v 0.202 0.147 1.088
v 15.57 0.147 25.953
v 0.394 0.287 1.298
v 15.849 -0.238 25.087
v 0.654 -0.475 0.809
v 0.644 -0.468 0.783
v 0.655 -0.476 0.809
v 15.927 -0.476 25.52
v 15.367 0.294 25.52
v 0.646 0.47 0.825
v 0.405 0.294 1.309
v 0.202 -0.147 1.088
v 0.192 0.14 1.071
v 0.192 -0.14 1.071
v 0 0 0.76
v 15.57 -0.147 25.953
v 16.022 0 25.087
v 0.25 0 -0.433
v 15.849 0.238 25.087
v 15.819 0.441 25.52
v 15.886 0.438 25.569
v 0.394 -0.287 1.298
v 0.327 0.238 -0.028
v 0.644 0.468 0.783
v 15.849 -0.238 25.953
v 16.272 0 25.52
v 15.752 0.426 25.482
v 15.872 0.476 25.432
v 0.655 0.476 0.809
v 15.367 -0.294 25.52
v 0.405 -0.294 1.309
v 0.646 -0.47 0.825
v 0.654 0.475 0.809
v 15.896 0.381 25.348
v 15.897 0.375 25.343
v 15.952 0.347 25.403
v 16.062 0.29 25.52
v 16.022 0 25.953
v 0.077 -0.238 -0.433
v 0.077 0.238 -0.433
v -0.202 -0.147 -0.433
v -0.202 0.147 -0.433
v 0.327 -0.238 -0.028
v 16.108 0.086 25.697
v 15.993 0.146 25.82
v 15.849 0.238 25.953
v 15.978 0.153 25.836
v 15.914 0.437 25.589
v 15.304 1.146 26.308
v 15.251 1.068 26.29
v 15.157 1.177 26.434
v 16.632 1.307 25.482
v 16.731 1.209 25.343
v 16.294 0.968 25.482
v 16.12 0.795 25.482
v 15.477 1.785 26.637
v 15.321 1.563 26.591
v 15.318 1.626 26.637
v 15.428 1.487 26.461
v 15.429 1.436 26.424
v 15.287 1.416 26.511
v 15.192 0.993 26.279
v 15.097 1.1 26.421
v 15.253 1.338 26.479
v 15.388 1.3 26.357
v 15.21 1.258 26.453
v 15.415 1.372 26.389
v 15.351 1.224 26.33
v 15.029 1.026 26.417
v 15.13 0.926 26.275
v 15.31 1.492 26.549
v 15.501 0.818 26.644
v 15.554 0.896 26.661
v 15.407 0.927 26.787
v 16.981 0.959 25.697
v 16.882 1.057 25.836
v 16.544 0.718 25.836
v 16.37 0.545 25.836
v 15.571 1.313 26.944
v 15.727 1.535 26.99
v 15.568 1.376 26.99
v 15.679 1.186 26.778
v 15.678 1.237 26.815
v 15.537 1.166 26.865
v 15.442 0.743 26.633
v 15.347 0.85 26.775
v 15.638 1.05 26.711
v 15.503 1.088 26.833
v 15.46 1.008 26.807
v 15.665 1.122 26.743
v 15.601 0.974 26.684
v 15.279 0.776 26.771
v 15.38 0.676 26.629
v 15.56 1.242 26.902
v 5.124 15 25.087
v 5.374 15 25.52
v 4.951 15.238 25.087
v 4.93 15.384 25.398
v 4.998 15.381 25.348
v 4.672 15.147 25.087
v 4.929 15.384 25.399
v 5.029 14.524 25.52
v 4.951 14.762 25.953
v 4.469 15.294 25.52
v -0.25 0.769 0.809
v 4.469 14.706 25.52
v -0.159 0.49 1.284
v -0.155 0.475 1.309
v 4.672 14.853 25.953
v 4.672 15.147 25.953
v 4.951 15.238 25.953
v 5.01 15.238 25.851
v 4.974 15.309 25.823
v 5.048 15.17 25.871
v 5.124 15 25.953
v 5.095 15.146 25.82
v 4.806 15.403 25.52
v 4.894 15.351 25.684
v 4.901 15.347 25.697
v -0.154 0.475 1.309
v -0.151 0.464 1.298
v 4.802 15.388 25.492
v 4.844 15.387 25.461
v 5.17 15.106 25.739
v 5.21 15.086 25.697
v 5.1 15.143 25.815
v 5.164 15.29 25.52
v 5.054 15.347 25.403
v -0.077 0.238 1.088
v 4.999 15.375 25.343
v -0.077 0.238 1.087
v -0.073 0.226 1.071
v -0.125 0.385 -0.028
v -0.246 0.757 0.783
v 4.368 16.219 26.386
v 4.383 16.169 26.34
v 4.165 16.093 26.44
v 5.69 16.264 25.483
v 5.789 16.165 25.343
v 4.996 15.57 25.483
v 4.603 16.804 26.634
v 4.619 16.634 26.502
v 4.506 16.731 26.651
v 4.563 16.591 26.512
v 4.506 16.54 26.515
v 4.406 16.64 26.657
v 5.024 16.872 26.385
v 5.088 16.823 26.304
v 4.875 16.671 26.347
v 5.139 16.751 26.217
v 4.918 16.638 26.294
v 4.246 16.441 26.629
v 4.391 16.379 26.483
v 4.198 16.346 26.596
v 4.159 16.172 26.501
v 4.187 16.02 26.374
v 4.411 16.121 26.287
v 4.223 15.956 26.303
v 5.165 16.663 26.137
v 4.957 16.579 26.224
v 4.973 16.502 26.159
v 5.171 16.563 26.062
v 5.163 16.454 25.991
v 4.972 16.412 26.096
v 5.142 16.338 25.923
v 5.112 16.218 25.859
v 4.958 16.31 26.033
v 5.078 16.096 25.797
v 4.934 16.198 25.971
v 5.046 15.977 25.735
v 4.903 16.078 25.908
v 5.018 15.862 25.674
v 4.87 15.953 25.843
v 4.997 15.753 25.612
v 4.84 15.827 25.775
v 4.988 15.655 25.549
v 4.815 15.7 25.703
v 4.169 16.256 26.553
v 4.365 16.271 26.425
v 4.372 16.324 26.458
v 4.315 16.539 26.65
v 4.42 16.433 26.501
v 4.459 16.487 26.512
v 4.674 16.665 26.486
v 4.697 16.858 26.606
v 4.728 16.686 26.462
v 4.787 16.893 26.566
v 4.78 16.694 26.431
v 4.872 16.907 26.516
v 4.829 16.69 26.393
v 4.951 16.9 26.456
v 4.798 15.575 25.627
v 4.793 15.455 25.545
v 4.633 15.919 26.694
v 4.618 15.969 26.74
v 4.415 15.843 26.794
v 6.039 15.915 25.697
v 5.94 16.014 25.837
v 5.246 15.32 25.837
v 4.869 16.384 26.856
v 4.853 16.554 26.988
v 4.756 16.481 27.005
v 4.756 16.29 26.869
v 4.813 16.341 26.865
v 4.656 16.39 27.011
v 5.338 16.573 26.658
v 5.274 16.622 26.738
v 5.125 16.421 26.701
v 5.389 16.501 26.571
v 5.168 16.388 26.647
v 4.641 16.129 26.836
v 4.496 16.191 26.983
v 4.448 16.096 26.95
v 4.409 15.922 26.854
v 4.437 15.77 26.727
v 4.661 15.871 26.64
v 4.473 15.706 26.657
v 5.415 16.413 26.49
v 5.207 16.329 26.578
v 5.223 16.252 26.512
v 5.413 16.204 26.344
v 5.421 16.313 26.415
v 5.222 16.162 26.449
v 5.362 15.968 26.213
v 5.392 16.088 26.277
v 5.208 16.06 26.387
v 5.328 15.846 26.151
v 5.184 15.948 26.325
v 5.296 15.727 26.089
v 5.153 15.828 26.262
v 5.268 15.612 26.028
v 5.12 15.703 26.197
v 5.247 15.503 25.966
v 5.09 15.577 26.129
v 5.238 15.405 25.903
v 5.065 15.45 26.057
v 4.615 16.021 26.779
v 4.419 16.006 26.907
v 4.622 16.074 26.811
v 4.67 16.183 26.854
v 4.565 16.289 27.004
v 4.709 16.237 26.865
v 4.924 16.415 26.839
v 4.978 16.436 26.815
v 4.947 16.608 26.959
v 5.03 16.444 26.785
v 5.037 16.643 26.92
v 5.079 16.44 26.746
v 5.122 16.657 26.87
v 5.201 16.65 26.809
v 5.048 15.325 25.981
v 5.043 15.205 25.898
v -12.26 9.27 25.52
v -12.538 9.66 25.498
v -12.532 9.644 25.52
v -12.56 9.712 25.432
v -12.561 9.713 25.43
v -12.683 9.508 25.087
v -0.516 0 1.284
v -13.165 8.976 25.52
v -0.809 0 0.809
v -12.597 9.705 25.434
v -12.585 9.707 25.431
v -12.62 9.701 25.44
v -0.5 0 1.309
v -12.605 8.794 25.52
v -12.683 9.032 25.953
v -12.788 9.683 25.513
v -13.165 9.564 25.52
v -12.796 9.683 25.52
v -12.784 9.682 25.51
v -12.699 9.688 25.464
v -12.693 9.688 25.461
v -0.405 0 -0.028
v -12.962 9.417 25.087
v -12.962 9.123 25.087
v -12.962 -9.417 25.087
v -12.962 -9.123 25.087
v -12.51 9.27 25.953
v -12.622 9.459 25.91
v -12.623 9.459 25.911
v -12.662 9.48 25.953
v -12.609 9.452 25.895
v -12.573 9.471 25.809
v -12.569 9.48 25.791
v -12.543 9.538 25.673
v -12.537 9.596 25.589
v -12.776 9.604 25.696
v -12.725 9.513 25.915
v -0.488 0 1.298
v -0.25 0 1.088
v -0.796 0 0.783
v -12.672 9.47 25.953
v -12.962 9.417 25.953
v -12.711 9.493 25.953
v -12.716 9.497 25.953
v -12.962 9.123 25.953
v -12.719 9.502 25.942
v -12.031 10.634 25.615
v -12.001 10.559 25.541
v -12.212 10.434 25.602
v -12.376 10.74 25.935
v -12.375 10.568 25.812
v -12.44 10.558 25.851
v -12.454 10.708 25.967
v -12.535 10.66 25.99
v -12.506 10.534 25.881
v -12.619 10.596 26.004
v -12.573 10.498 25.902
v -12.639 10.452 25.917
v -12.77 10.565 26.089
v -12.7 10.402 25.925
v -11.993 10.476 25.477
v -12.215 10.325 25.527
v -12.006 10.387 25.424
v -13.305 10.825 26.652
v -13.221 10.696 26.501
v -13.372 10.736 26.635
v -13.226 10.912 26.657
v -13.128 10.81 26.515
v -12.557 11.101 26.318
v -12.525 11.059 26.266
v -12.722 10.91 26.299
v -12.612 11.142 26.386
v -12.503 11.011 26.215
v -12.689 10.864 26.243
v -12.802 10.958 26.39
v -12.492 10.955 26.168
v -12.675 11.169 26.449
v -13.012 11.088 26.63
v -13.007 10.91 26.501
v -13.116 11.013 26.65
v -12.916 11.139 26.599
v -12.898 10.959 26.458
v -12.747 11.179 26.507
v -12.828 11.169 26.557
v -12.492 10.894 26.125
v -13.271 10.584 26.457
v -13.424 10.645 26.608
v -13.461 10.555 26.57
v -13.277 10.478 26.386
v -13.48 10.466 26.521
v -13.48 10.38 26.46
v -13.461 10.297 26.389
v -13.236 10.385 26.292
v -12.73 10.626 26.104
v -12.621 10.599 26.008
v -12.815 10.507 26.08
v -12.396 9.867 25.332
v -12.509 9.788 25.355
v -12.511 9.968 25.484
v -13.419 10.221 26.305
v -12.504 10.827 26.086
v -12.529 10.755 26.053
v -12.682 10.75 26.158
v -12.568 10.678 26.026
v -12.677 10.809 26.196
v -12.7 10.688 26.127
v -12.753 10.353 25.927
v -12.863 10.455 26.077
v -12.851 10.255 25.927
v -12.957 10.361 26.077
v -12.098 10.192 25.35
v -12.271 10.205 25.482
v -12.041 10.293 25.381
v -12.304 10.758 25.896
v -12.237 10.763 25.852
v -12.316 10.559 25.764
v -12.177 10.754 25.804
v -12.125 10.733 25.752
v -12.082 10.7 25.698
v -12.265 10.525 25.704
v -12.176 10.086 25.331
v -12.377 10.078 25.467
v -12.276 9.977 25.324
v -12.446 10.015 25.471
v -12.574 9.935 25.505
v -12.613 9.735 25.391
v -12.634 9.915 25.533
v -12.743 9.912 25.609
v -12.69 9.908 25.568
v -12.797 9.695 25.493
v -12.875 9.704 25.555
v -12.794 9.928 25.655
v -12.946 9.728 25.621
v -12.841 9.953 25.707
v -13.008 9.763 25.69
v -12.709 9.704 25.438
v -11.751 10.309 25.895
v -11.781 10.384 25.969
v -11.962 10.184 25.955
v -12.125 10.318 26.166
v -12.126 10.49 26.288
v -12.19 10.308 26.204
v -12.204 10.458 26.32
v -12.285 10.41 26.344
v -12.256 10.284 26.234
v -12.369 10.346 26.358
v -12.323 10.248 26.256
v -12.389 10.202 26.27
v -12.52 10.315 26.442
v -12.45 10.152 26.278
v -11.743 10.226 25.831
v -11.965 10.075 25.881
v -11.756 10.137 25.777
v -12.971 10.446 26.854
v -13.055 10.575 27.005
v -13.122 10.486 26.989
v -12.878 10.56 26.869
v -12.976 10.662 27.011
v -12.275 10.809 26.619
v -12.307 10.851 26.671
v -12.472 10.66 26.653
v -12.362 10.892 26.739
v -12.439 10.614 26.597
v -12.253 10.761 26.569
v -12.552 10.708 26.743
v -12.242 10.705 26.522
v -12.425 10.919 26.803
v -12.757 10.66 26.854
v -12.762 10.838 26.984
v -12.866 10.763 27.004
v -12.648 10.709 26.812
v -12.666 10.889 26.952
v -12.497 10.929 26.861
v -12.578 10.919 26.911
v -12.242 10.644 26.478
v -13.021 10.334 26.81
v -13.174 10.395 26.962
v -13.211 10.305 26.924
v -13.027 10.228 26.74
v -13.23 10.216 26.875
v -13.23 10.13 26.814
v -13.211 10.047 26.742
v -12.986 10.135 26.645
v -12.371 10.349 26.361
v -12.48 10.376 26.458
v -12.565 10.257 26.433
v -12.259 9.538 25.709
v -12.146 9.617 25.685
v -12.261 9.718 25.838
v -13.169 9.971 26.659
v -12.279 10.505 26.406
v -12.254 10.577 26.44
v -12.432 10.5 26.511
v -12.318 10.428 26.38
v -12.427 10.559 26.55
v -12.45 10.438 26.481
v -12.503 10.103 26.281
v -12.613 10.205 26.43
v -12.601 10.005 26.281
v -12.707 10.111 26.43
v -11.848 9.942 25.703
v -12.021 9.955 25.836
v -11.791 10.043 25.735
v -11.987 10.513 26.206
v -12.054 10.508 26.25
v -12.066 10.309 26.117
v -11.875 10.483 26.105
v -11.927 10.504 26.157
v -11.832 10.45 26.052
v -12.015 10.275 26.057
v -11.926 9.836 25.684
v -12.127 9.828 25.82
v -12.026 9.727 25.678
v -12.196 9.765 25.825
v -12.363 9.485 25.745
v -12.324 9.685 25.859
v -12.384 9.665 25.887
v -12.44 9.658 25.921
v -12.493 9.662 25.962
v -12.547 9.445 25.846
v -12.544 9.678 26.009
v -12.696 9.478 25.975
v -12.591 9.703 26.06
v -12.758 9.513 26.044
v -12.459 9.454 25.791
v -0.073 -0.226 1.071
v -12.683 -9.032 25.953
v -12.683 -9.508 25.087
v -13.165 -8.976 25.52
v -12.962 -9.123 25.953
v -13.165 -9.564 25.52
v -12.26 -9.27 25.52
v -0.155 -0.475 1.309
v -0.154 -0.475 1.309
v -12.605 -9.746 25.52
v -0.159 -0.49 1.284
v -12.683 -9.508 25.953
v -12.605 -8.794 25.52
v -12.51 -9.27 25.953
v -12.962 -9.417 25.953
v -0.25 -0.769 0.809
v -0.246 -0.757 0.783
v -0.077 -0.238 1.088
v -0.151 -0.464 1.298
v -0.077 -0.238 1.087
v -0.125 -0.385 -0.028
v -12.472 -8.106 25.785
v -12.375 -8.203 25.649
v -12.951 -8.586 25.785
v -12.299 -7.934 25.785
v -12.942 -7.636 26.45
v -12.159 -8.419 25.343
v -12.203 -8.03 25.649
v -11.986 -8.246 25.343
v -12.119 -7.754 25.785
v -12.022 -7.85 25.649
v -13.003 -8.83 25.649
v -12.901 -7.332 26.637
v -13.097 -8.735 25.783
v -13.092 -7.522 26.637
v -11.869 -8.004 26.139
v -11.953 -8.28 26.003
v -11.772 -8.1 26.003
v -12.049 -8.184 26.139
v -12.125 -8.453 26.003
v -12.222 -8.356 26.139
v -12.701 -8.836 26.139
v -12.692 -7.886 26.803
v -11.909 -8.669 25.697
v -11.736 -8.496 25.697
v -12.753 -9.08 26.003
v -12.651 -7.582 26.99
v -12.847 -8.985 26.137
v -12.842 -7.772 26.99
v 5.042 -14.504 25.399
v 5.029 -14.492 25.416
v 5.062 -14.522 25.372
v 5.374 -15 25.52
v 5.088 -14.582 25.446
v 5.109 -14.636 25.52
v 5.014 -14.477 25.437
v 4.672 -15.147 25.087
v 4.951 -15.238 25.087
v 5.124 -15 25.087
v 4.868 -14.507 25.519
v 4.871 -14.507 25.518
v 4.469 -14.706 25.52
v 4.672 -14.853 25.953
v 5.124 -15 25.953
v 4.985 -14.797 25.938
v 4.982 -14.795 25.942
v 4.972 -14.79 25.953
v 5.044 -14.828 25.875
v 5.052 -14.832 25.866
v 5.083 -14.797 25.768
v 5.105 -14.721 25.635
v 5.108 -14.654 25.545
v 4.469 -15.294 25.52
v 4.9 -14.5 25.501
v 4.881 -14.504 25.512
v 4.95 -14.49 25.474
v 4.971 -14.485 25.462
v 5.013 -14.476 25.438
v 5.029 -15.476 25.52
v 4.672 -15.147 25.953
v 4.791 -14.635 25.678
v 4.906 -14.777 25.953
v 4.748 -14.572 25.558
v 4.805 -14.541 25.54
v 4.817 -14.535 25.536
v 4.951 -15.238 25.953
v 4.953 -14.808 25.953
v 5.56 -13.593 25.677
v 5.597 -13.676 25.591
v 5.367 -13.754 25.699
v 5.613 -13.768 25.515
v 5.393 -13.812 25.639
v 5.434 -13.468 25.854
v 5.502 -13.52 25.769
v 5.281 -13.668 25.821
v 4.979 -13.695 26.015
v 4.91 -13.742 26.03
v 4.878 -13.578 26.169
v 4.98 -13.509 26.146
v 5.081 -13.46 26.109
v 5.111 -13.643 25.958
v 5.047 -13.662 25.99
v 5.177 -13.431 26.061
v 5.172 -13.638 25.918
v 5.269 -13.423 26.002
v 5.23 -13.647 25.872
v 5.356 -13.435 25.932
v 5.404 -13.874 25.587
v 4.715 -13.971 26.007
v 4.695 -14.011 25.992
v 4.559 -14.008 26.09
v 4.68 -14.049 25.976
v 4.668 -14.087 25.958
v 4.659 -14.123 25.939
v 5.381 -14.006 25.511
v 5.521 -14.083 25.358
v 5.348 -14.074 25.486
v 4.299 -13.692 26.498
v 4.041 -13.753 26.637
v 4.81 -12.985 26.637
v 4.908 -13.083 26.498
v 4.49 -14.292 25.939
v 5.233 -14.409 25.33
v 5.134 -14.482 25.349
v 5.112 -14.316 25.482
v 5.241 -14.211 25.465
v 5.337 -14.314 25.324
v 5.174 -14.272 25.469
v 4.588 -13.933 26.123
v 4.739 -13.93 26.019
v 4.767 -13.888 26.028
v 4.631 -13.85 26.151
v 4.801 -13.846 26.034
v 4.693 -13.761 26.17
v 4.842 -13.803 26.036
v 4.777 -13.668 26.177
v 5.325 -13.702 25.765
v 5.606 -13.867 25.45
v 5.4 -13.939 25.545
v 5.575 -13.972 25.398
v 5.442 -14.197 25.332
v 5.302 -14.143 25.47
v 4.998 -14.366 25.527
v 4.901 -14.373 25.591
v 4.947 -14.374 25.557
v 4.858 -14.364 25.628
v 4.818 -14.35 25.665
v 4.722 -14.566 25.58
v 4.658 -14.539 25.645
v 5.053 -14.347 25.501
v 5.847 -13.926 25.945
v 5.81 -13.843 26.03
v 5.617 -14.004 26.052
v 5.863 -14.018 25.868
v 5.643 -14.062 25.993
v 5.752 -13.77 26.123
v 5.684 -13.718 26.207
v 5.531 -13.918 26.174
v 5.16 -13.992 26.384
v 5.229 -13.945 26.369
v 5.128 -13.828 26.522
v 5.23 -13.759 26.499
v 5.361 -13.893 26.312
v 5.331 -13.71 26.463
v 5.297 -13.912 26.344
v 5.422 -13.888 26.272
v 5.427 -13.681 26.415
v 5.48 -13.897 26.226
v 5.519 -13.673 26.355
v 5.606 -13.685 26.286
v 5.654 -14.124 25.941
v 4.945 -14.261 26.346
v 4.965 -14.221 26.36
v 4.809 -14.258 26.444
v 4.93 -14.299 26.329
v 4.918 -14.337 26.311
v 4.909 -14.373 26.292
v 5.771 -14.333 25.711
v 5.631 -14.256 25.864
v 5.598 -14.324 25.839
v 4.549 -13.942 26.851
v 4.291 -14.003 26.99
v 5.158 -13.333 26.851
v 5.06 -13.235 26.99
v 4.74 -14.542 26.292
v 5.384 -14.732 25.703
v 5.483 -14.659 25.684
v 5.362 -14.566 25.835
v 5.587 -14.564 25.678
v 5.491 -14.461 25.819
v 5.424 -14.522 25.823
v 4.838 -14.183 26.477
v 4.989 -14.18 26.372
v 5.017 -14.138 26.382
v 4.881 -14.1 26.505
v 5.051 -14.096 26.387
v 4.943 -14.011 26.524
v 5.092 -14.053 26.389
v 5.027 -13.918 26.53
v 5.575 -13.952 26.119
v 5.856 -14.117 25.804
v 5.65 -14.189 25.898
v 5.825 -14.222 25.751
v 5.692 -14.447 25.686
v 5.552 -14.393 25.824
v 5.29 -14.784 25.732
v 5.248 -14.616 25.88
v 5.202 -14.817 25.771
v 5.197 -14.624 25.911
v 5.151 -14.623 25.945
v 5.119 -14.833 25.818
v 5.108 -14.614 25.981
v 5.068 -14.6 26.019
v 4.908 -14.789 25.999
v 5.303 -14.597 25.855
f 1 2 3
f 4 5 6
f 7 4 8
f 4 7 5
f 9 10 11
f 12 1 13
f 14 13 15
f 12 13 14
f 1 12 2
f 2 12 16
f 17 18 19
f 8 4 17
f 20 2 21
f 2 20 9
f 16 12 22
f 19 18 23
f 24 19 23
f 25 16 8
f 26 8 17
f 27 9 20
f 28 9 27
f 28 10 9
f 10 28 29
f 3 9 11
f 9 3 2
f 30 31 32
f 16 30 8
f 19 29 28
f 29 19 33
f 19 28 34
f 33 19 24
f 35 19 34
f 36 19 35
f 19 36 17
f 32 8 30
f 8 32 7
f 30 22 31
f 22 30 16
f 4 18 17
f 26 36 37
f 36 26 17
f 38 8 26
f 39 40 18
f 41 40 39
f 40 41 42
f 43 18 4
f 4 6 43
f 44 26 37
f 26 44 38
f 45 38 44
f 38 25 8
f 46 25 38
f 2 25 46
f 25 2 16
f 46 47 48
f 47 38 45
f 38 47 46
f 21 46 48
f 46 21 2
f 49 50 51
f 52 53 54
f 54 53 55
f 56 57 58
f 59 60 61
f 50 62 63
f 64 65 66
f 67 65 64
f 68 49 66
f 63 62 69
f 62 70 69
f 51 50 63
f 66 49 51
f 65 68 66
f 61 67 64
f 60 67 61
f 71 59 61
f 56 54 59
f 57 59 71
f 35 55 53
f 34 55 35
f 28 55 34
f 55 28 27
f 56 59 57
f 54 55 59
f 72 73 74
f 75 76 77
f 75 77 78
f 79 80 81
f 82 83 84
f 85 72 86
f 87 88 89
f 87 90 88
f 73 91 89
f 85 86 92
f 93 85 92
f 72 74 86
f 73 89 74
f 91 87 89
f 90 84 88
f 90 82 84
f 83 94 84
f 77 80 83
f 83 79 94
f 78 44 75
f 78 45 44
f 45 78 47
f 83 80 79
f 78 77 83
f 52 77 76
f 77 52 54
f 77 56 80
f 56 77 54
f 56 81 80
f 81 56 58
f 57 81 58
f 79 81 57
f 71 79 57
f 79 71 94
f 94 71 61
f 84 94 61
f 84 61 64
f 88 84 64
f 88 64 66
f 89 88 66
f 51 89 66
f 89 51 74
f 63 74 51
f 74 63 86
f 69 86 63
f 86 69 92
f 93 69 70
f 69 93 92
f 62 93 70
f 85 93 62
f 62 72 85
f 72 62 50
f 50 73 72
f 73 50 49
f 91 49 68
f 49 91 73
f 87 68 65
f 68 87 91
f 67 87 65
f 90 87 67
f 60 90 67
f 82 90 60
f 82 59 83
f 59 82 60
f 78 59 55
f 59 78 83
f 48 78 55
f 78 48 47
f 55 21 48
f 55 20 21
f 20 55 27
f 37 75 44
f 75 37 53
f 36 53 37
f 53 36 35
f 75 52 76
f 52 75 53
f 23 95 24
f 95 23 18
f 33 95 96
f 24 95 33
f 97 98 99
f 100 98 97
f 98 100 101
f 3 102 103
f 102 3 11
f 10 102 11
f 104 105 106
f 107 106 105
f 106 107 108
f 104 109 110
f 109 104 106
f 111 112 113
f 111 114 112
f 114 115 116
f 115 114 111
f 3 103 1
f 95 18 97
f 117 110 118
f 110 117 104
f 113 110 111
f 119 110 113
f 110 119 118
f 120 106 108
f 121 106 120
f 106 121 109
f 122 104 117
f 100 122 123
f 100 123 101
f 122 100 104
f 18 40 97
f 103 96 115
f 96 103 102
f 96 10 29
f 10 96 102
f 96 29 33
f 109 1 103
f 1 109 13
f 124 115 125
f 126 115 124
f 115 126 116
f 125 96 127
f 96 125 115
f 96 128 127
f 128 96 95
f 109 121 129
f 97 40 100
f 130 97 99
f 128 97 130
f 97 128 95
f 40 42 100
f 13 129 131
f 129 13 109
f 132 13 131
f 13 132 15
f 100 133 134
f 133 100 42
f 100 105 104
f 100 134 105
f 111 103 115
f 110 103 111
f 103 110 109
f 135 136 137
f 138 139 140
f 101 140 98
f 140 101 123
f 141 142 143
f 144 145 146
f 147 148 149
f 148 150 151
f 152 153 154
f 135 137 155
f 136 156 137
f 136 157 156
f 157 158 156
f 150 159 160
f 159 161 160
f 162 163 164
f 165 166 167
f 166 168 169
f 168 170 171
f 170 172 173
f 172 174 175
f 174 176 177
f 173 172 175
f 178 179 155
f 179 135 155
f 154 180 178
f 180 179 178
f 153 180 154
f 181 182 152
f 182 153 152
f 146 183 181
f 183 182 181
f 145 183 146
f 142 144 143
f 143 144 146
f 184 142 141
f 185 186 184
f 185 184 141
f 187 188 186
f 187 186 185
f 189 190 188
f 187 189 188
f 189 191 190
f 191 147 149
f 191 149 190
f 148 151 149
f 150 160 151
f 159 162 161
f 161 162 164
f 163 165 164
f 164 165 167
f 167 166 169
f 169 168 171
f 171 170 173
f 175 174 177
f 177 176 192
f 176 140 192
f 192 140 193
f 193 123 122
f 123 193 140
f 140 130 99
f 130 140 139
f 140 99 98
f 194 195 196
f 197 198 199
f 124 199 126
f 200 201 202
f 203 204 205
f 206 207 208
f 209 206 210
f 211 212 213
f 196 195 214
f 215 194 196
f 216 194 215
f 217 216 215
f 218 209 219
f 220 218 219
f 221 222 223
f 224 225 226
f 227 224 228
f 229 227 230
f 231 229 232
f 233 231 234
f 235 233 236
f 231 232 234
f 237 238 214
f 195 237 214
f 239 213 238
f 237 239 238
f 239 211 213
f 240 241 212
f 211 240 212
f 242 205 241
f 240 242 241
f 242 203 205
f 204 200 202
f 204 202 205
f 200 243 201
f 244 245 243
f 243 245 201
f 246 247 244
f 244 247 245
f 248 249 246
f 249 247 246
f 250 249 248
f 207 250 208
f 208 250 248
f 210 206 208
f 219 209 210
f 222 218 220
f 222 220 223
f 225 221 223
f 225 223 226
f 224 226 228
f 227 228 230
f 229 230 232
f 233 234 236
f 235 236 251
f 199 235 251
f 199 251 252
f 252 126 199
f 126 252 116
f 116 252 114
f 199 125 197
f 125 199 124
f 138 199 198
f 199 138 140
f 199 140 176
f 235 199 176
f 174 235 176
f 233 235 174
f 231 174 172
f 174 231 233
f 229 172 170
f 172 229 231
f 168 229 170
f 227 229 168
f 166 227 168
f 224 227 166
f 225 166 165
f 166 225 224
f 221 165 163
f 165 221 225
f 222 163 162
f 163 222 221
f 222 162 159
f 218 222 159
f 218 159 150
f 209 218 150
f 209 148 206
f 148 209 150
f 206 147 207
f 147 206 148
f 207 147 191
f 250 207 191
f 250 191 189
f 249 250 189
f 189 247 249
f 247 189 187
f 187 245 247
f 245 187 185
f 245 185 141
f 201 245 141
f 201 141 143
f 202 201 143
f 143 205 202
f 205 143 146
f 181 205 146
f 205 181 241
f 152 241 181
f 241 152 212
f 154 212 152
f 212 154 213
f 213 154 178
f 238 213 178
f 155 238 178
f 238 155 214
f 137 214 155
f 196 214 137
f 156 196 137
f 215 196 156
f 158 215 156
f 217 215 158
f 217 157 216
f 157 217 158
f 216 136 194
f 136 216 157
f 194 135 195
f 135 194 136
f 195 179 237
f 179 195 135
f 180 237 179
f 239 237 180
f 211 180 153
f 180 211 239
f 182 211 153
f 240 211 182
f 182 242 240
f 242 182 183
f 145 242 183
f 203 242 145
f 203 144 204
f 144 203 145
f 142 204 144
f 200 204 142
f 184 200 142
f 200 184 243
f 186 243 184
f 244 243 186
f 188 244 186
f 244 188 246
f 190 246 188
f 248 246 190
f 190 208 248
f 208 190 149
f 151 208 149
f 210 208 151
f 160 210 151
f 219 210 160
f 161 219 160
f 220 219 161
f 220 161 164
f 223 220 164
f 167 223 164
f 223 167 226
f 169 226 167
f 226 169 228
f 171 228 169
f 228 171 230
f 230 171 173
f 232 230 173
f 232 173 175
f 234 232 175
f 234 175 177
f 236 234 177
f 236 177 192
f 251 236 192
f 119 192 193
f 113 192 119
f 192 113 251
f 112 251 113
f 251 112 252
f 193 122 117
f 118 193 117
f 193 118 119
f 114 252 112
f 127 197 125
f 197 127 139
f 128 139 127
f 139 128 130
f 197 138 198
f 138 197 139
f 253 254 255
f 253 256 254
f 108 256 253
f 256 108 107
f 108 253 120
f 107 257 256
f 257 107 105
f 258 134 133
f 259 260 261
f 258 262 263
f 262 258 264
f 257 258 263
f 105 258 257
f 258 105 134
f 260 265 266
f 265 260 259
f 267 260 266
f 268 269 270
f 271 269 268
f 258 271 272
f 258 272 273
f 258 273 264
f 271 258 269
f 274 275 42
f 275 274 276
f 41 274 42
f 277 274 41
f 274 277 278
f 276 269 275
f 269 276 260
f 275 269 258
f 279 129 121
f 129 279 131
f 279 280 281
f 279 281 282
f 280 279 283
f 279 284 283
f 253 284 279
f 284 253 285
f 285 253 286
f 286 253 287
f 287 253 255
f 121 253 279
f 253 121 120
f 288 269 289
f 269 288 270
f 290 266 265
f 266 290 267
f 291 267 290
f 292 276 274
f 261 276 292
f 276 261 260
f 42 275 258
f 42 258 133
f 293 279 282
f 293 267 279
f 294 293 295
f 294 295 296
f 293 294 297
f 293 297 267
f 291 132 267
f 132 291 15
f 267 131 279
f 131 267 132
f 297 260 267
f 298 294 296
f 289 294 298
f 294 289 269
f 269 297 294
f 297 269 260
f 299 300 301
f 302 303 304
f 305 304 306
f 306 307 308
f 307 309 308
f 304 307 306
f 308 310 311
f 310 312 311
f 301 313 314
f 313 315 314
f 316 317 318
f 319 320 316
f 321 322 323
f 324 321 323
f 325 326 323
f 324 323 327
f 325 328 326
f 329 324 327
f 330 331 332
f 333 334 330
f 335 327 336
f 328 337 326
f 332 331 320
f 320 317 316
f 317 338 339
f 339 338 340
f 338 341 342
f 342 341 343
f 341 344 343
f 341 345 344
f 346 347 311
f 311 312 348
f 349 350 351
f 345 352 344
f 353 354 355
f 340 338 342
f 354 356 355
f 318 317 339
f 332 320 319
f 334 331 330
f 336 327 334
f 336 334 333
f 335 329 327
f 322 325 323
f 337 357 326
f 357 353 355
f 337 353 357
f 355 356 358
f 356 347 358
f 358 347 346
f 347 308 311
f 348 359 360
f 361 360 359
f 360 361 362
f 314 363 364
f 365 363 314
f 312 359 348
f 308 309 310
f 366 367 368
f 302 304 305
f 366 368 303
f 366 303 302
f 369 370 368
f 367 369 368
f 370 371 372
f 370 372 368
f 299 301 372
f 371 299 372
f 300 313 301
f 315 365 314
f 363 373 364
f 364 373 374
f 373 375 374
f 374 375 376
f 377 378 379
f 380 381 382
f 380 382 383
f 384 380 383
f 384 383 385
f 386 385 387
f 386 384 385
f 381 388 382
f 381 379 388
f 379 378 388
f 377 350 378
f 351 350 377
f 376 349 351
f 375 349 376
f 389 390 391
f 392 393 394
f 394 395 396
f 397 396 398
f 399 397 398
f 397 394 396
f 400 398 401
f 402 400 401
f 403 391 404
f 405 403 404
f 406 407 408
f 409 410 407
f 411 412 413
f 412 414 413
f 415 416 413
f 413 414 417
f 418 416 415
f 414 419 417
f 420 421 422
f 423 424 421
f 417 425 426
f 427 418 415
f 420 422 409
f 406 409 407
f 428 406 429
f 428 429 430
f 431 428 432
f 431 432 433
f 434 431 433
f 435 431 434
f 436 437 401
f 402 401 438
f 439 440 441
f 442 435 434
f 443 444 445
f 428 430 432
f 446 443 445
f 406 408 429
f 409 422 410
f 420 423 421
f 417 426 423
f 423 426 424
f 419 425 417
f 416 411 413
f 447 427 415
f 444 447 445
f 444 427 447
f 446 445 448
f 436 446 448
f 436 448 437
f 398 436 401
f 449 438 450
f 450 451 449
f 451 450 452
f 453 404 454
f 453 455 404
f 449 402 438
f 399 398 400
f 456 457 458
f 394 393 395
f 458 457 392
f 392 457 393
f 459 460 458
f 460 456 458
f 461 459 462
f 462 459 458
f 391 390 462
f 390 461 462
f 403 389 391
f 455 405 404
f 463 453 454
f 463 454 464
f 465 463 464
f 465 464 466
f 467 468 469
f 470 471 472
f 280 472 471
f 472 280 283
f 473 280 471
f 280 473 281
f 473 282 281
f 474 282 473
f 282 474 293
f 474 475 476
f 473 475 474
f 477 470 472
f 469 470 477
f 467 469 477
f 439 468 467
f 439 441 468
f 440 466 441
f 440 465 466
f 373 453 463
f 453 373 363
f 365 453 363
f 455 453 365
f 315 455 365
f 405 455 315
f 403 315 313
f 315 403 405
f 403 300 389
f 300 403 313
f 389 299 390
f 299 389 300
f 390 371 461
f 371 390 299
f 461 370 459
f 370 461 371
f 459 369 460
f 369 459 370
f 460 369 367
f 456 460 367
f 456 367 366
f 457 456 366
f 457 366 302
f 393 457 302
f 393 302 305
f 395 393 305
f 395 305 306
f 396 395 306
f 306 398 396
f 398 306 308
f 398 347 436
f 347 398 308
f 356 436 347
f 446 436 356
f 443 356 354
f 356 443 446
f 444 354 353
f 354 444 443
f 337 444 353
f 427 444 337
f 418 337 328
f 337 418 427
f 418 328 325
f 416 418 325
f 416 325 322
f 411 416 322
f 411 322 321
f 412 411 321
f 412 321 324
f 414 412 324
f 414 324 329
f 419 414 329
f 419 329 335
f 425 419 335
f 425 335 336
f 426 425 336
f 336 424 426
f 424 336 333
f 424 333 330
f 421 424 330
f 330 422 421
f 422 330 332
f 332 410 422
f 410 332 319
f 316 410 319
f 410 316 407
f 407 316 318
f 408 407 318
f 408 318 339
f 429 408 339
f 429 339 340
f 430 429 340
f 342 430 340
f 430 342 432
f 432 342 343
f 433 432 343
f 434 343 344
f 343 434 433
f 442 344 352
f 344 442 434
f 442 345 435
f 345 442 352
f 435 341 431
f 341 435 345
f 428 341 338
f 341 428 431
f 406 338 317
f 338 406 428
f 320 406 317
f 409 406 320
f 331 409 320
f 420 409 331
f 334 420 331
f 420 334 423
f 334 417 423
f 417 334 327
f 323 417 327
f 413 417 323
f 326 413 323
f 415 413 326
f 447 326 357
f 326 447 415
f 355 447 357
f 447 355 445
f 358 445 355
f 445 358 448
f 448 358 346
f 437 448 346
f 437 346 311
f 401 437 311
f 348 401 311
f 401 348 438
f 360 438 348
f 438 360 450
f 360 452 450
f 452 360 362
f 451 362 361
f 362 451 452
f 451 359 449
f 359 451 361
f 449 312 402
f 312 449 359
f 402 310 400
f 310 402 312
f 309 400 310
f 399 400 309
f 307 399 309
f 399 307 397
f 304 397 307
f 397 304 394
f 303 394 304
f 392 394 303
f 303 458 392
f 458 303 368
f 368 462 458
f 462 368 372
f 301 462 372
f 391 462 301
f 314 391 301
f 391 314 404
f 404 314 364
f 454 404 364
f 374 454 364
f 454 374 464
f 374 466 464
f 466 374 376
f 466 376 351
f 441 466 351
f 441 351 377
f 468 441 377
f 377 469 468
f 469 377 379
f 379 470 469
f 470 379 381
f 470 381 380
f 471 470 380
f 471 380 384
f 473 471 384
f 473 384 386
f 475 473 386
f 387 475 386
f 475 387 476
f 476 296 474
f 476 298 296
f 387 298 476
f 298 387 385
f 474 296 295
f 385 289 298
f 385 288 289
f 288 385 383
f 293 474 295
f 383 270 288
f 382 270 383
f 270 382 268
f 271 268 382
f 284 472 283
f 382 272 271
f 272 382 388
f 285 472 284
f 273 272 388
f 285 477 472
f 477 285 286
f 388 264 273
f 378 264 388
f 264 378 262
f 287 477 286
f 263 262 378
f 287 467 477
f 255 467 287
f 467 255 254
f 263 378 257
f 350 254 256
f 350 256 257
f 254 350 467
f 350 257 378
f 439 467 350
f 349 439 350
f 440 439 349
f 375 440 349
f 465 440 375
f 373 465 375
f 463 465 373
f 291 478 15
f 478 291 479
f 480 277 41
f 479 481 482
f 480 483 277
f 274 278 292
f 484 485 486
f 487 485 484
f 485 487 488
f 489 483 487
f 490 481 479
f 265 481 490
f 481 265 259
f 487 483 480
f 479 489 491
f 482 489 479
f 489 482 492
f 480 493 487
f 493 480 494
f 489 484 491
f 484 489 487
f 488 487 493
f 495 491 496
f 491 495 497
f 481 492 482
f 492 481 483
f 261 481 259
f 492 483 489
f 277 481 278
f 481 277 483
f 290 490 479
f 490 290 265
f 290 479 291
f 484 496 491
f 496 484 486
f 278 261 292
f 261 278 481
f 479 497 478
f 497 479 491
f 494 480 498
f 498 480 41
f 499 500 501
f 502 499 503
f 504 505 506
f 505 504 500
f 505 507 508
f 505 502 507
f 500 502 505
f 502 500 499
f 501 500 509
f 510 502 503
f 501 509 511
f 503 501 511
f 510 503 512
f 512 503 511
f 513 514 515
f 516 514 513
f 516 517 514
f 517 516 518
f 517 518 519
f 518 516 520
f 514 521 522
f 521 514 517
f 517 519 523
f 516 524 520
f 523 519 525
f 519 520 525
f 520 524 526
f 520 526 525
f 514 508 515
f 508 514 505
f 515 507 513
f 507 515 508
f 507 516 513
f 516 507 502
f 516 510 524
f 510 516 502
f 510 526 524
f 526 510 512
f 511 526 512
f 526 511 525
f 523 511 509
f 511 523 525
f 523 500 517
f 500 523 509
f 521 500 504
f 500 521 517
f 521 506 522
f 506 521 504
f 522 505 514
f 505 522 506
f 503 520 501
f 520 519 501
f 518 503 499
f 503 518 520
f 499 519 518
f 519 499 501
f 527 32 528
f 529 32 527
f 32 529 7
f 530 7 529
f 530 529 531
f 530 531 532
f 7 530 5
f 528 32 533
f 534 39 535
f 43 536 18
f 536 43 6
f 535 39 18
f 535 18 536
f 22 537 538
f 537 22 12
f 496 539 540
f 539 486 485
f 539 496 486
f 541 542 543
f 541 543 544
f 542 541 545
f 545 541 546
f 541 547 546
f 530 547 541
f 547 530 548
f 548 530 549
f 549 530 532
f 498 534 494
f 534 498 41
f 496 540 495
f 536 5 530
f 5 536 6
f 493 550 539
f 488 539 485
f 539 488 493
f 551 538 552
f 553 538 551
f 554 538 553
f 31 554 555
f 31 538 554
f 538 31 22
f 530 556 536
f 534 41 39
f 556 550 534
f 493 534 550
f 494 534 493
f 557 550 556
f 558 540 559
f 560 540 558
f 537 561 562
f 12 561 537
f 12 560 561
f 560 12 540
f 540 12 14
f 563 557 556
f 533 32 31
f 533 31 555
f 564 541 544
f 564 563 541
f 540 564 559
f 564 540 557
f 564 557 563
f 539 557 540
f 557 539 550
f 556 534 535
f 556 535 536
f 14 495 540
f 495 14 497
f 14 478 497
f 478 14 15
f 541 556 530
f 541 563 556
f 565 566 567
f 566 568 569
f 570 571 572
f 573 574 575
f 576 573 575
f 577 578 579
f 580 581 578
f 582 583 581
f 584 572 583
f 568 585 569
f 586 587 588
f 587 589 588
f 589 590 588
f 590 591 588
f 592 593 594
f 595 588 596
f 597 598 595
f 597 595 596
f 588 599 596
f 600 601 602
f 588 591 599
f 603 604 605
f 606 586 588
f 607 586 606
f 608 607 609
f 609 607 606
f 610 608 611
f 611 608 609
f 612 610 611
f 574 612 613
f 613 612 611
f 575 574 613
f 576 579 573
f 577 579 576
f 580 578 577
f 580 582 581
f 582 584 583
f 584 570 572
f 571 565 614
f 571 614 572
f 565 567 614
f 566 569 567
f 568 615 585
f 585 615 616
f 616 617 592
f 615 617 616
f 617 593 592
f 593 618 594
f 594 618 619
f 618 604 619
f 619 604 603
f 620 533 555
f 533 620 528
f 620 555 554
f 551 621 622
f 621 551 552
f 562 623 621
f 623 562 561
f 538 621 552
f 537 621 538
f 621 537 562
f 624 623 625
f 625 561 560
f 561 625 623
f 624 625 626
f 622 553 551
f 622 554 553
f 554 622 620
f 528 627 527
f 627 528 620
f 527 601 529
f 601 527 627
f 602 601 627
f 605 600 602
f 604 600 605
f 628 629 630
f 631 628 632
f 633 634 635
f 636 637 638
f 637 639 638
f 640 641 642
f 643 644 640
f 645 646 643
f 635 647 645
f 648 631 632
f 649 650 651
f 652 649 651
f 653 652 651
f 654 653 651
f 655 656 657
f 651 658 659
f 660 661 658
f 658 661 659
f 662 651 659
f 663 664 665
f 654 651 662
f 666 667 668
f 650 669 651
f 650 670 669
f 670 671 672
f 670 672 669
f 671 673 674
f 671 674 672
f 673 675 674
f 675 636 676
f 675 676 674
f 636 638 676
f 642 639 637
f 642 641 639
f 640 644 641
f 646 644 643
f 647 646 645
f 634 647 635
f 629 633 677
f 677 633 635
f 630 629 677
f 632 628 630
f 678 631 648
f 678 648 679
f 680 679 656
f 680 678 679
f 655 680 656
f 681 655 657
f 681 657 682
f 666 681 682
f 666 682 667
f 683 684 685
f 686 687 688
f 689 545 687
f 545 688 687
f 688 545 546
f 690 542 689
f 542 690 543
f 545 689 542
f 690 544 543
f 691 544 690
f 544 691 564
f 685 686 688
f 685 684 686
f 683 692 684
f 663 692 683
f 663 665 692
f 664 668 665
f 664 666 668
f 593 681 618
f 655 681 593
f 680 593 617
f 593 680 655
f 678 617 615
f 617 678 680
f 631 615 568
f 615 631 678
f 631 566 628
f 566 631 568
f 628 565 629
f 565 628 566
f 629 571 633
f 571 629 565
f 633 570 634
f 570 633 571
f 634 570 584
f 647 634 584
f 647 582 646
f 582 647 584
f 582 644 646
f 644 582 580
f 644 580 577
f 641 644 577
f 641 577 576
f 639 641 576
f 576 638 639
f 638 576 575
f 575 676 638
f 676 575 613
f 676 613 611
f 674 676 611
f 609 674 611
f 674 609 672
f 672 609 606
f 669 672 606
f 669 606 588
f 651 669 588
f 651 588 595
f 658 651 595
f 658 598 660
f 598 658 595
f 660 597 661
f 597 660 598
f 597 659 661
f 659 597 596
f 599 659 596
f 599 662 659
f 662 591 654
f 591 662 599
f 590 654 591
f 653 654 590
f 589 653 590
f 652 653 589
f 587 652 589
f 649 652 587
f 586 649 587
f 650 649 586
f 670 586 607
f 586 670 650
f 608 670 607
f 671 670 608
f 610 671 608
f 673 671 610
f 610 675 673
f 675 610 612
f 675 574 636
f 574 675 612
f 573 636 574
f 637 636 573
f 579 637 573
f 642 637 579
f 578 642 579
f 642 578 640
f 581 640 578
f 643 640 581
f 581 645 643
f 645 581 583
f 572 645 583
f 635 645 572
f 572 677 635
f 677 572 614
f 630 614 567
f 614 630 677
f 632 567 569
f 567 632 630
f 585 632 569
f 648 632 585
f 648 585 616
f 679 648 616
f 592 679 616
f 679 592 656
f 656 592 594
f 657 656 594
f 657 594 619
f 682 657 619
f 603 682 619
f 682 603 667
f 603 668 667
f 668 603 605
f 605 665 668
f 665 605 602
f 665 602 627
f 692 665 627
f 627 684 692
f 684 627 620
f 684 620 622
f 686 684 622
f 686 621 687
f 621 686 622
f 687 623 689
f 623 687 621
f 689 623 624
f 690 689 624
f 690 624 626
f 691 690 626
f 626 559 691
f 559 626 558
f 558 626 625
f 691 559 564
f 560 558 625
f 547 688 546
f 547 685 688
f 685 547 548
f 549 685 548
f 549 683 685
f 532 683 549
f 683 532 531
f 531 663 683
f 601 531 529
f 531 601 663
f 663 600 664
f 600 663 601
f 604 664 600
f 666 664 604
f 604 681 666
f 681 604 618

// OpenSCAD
// 7/10/2016
// axis angles and rotation matrices 

// Sorted dome test 2016/06/08 19:01:44

// Frequency: 2
// Radius: 30.0
//Vertices: 36
V = [
	[   0.000,    0.000,   30.000], //  0 0-0
	[  15.772,    0.000,   25.520], //  1 1-0
	[   4.874,   15.000,   25.520], //  2 1-1
	[ -12.760,    9.270,   25.520], //  3 1-2
	[ -12.760,   -9.270,   25.520], //  4 1-3
	[   4.874,  -15.000,   25.520], //  5 1-4
	[  20.646,   15.000,   15.772], //  6 2-0
	[  -7.886,   24.270,   15.772], //  7 2-1
	[ -25.520,    0.000,   15.772], //  8 2-2
	[  -7.886,  -24.270,   15.772], //  9 2-3
	[  20.646,  -15.000,   15.772], // 10 2-4
	[  26.833,    0.000,   13.416], // 11 3-0
	[   8.292,   25.520,   13.416], // 12 3-1
	[ -21.708,   15.772,   13.416], // 13 3-2
	[ -21.708,  -15.772,   13.416], // 14 3-3
	[   8.292,  -25.520,   13.416], // 15 3-4
	[  28.532,    9.270,    0.000], // 16 4-0
	[  17.634,   24.271,    0.000], // 17 4-1
	[   0.000,   30.000,    0.000], // 18 4-2
	[ -17.634,   24.271,    0.000], // 19 4-3
	[ -28.532,    9.271,    0.000], // 20 4-4
	[ -28.532,   -9.270,    0.000], // 21 4-5
	[ -17.634,  -24.271,    0.000], // 22 4-6
	[   0.000,  -30.000,    0.000], // 23 4-7
	[  17.634,  -24.271,    0.000], // 24 4-8
	[  28.532,   -9.270,    0.000], // 25 4-9
	[  21.708,   15.772,  -13.416], // 26 5-0
	[  -8.292,   25.520,  -13.416], // 27 5-1
	[ -26.833,    0.000,  -13.416], // 28 5-2
	[  -8.292,  -25.520,  -13.416], // 29 5-3
	[  21.708,  -15.772,  -13.416], // 30 5-4
	[  25.520,    0.000,  -15.772], // 31 6-0
	[   7.886,   24.271,  -15.772], // 32 6-1
	[ -20.646,   15.000,  -15.772], // 33 6-2
	[ -20.646,  -15.000,  -15.772], // 34 6-3
	[   7.886,  -24.271,  -15.772]  // 35 6-4
];

function abs_add(x, n) = (x<0) ? x-n : x+n;

// p = [x, y, z] 
module dot_vertex(radius, p, c1="red")
{
    translate(p) color(c1) sphere(radius, center=true);    
}

module letter_vertex(font_size=5, letter, p, p_offset=5, c1="black")
{
    x = abs_add(p[0], p_offset);
    y = abs_add(p[1], p_offset);
    z = abs_add(p[2], p_offset);
    translate([x, y, z]) color(c1) rotate([45, 0, 45])    
    linear_extrude(height=0.5, center = true, convexity = 10, twist = 0)
            text(letter, size=font_size, font="Courier");
}

// Draw one vertex in V 
module mark_vertex(vertices, index, c1="red")
{
    end = len(vertices);
    if ((index >= 0) && (index < end))
    {
       echo("Vertex", index, vertices[index]);
       dot_vertex(default_radius*1.1, vertices[index], c1);
    }
    else
       echo("mark_vertex(): out of range."); 
}

// size: radius of edge tube 
module draw_edge(v, w, size=0.5, c1="green")
{
    color(c1) hull()
    {  
        translate(v) sphere(r=size);
        translate(w) sphere(r=size);
        echo(w);
    }
}

module point_vector(array, index, size=0.5, c1="green")
{
    o = [0.0, 0.0, 0.0];
    v = array[index];
    color(c1) hull()
    {
        translate(o) sphere(r=size);
        translate(v) sphere(r=size);
    }
    letter_vertex(2, str(index), v, p_offset=0, c1="black");
    echo(index, v);
}

origin = [0.0, 0.0, 0.0];

// 1st level 
point_vector(V, 1);
point_vector(V, 2);
point_vector(V, 3);
point_vector(V, 4);
point_vector(V, 5);

//
